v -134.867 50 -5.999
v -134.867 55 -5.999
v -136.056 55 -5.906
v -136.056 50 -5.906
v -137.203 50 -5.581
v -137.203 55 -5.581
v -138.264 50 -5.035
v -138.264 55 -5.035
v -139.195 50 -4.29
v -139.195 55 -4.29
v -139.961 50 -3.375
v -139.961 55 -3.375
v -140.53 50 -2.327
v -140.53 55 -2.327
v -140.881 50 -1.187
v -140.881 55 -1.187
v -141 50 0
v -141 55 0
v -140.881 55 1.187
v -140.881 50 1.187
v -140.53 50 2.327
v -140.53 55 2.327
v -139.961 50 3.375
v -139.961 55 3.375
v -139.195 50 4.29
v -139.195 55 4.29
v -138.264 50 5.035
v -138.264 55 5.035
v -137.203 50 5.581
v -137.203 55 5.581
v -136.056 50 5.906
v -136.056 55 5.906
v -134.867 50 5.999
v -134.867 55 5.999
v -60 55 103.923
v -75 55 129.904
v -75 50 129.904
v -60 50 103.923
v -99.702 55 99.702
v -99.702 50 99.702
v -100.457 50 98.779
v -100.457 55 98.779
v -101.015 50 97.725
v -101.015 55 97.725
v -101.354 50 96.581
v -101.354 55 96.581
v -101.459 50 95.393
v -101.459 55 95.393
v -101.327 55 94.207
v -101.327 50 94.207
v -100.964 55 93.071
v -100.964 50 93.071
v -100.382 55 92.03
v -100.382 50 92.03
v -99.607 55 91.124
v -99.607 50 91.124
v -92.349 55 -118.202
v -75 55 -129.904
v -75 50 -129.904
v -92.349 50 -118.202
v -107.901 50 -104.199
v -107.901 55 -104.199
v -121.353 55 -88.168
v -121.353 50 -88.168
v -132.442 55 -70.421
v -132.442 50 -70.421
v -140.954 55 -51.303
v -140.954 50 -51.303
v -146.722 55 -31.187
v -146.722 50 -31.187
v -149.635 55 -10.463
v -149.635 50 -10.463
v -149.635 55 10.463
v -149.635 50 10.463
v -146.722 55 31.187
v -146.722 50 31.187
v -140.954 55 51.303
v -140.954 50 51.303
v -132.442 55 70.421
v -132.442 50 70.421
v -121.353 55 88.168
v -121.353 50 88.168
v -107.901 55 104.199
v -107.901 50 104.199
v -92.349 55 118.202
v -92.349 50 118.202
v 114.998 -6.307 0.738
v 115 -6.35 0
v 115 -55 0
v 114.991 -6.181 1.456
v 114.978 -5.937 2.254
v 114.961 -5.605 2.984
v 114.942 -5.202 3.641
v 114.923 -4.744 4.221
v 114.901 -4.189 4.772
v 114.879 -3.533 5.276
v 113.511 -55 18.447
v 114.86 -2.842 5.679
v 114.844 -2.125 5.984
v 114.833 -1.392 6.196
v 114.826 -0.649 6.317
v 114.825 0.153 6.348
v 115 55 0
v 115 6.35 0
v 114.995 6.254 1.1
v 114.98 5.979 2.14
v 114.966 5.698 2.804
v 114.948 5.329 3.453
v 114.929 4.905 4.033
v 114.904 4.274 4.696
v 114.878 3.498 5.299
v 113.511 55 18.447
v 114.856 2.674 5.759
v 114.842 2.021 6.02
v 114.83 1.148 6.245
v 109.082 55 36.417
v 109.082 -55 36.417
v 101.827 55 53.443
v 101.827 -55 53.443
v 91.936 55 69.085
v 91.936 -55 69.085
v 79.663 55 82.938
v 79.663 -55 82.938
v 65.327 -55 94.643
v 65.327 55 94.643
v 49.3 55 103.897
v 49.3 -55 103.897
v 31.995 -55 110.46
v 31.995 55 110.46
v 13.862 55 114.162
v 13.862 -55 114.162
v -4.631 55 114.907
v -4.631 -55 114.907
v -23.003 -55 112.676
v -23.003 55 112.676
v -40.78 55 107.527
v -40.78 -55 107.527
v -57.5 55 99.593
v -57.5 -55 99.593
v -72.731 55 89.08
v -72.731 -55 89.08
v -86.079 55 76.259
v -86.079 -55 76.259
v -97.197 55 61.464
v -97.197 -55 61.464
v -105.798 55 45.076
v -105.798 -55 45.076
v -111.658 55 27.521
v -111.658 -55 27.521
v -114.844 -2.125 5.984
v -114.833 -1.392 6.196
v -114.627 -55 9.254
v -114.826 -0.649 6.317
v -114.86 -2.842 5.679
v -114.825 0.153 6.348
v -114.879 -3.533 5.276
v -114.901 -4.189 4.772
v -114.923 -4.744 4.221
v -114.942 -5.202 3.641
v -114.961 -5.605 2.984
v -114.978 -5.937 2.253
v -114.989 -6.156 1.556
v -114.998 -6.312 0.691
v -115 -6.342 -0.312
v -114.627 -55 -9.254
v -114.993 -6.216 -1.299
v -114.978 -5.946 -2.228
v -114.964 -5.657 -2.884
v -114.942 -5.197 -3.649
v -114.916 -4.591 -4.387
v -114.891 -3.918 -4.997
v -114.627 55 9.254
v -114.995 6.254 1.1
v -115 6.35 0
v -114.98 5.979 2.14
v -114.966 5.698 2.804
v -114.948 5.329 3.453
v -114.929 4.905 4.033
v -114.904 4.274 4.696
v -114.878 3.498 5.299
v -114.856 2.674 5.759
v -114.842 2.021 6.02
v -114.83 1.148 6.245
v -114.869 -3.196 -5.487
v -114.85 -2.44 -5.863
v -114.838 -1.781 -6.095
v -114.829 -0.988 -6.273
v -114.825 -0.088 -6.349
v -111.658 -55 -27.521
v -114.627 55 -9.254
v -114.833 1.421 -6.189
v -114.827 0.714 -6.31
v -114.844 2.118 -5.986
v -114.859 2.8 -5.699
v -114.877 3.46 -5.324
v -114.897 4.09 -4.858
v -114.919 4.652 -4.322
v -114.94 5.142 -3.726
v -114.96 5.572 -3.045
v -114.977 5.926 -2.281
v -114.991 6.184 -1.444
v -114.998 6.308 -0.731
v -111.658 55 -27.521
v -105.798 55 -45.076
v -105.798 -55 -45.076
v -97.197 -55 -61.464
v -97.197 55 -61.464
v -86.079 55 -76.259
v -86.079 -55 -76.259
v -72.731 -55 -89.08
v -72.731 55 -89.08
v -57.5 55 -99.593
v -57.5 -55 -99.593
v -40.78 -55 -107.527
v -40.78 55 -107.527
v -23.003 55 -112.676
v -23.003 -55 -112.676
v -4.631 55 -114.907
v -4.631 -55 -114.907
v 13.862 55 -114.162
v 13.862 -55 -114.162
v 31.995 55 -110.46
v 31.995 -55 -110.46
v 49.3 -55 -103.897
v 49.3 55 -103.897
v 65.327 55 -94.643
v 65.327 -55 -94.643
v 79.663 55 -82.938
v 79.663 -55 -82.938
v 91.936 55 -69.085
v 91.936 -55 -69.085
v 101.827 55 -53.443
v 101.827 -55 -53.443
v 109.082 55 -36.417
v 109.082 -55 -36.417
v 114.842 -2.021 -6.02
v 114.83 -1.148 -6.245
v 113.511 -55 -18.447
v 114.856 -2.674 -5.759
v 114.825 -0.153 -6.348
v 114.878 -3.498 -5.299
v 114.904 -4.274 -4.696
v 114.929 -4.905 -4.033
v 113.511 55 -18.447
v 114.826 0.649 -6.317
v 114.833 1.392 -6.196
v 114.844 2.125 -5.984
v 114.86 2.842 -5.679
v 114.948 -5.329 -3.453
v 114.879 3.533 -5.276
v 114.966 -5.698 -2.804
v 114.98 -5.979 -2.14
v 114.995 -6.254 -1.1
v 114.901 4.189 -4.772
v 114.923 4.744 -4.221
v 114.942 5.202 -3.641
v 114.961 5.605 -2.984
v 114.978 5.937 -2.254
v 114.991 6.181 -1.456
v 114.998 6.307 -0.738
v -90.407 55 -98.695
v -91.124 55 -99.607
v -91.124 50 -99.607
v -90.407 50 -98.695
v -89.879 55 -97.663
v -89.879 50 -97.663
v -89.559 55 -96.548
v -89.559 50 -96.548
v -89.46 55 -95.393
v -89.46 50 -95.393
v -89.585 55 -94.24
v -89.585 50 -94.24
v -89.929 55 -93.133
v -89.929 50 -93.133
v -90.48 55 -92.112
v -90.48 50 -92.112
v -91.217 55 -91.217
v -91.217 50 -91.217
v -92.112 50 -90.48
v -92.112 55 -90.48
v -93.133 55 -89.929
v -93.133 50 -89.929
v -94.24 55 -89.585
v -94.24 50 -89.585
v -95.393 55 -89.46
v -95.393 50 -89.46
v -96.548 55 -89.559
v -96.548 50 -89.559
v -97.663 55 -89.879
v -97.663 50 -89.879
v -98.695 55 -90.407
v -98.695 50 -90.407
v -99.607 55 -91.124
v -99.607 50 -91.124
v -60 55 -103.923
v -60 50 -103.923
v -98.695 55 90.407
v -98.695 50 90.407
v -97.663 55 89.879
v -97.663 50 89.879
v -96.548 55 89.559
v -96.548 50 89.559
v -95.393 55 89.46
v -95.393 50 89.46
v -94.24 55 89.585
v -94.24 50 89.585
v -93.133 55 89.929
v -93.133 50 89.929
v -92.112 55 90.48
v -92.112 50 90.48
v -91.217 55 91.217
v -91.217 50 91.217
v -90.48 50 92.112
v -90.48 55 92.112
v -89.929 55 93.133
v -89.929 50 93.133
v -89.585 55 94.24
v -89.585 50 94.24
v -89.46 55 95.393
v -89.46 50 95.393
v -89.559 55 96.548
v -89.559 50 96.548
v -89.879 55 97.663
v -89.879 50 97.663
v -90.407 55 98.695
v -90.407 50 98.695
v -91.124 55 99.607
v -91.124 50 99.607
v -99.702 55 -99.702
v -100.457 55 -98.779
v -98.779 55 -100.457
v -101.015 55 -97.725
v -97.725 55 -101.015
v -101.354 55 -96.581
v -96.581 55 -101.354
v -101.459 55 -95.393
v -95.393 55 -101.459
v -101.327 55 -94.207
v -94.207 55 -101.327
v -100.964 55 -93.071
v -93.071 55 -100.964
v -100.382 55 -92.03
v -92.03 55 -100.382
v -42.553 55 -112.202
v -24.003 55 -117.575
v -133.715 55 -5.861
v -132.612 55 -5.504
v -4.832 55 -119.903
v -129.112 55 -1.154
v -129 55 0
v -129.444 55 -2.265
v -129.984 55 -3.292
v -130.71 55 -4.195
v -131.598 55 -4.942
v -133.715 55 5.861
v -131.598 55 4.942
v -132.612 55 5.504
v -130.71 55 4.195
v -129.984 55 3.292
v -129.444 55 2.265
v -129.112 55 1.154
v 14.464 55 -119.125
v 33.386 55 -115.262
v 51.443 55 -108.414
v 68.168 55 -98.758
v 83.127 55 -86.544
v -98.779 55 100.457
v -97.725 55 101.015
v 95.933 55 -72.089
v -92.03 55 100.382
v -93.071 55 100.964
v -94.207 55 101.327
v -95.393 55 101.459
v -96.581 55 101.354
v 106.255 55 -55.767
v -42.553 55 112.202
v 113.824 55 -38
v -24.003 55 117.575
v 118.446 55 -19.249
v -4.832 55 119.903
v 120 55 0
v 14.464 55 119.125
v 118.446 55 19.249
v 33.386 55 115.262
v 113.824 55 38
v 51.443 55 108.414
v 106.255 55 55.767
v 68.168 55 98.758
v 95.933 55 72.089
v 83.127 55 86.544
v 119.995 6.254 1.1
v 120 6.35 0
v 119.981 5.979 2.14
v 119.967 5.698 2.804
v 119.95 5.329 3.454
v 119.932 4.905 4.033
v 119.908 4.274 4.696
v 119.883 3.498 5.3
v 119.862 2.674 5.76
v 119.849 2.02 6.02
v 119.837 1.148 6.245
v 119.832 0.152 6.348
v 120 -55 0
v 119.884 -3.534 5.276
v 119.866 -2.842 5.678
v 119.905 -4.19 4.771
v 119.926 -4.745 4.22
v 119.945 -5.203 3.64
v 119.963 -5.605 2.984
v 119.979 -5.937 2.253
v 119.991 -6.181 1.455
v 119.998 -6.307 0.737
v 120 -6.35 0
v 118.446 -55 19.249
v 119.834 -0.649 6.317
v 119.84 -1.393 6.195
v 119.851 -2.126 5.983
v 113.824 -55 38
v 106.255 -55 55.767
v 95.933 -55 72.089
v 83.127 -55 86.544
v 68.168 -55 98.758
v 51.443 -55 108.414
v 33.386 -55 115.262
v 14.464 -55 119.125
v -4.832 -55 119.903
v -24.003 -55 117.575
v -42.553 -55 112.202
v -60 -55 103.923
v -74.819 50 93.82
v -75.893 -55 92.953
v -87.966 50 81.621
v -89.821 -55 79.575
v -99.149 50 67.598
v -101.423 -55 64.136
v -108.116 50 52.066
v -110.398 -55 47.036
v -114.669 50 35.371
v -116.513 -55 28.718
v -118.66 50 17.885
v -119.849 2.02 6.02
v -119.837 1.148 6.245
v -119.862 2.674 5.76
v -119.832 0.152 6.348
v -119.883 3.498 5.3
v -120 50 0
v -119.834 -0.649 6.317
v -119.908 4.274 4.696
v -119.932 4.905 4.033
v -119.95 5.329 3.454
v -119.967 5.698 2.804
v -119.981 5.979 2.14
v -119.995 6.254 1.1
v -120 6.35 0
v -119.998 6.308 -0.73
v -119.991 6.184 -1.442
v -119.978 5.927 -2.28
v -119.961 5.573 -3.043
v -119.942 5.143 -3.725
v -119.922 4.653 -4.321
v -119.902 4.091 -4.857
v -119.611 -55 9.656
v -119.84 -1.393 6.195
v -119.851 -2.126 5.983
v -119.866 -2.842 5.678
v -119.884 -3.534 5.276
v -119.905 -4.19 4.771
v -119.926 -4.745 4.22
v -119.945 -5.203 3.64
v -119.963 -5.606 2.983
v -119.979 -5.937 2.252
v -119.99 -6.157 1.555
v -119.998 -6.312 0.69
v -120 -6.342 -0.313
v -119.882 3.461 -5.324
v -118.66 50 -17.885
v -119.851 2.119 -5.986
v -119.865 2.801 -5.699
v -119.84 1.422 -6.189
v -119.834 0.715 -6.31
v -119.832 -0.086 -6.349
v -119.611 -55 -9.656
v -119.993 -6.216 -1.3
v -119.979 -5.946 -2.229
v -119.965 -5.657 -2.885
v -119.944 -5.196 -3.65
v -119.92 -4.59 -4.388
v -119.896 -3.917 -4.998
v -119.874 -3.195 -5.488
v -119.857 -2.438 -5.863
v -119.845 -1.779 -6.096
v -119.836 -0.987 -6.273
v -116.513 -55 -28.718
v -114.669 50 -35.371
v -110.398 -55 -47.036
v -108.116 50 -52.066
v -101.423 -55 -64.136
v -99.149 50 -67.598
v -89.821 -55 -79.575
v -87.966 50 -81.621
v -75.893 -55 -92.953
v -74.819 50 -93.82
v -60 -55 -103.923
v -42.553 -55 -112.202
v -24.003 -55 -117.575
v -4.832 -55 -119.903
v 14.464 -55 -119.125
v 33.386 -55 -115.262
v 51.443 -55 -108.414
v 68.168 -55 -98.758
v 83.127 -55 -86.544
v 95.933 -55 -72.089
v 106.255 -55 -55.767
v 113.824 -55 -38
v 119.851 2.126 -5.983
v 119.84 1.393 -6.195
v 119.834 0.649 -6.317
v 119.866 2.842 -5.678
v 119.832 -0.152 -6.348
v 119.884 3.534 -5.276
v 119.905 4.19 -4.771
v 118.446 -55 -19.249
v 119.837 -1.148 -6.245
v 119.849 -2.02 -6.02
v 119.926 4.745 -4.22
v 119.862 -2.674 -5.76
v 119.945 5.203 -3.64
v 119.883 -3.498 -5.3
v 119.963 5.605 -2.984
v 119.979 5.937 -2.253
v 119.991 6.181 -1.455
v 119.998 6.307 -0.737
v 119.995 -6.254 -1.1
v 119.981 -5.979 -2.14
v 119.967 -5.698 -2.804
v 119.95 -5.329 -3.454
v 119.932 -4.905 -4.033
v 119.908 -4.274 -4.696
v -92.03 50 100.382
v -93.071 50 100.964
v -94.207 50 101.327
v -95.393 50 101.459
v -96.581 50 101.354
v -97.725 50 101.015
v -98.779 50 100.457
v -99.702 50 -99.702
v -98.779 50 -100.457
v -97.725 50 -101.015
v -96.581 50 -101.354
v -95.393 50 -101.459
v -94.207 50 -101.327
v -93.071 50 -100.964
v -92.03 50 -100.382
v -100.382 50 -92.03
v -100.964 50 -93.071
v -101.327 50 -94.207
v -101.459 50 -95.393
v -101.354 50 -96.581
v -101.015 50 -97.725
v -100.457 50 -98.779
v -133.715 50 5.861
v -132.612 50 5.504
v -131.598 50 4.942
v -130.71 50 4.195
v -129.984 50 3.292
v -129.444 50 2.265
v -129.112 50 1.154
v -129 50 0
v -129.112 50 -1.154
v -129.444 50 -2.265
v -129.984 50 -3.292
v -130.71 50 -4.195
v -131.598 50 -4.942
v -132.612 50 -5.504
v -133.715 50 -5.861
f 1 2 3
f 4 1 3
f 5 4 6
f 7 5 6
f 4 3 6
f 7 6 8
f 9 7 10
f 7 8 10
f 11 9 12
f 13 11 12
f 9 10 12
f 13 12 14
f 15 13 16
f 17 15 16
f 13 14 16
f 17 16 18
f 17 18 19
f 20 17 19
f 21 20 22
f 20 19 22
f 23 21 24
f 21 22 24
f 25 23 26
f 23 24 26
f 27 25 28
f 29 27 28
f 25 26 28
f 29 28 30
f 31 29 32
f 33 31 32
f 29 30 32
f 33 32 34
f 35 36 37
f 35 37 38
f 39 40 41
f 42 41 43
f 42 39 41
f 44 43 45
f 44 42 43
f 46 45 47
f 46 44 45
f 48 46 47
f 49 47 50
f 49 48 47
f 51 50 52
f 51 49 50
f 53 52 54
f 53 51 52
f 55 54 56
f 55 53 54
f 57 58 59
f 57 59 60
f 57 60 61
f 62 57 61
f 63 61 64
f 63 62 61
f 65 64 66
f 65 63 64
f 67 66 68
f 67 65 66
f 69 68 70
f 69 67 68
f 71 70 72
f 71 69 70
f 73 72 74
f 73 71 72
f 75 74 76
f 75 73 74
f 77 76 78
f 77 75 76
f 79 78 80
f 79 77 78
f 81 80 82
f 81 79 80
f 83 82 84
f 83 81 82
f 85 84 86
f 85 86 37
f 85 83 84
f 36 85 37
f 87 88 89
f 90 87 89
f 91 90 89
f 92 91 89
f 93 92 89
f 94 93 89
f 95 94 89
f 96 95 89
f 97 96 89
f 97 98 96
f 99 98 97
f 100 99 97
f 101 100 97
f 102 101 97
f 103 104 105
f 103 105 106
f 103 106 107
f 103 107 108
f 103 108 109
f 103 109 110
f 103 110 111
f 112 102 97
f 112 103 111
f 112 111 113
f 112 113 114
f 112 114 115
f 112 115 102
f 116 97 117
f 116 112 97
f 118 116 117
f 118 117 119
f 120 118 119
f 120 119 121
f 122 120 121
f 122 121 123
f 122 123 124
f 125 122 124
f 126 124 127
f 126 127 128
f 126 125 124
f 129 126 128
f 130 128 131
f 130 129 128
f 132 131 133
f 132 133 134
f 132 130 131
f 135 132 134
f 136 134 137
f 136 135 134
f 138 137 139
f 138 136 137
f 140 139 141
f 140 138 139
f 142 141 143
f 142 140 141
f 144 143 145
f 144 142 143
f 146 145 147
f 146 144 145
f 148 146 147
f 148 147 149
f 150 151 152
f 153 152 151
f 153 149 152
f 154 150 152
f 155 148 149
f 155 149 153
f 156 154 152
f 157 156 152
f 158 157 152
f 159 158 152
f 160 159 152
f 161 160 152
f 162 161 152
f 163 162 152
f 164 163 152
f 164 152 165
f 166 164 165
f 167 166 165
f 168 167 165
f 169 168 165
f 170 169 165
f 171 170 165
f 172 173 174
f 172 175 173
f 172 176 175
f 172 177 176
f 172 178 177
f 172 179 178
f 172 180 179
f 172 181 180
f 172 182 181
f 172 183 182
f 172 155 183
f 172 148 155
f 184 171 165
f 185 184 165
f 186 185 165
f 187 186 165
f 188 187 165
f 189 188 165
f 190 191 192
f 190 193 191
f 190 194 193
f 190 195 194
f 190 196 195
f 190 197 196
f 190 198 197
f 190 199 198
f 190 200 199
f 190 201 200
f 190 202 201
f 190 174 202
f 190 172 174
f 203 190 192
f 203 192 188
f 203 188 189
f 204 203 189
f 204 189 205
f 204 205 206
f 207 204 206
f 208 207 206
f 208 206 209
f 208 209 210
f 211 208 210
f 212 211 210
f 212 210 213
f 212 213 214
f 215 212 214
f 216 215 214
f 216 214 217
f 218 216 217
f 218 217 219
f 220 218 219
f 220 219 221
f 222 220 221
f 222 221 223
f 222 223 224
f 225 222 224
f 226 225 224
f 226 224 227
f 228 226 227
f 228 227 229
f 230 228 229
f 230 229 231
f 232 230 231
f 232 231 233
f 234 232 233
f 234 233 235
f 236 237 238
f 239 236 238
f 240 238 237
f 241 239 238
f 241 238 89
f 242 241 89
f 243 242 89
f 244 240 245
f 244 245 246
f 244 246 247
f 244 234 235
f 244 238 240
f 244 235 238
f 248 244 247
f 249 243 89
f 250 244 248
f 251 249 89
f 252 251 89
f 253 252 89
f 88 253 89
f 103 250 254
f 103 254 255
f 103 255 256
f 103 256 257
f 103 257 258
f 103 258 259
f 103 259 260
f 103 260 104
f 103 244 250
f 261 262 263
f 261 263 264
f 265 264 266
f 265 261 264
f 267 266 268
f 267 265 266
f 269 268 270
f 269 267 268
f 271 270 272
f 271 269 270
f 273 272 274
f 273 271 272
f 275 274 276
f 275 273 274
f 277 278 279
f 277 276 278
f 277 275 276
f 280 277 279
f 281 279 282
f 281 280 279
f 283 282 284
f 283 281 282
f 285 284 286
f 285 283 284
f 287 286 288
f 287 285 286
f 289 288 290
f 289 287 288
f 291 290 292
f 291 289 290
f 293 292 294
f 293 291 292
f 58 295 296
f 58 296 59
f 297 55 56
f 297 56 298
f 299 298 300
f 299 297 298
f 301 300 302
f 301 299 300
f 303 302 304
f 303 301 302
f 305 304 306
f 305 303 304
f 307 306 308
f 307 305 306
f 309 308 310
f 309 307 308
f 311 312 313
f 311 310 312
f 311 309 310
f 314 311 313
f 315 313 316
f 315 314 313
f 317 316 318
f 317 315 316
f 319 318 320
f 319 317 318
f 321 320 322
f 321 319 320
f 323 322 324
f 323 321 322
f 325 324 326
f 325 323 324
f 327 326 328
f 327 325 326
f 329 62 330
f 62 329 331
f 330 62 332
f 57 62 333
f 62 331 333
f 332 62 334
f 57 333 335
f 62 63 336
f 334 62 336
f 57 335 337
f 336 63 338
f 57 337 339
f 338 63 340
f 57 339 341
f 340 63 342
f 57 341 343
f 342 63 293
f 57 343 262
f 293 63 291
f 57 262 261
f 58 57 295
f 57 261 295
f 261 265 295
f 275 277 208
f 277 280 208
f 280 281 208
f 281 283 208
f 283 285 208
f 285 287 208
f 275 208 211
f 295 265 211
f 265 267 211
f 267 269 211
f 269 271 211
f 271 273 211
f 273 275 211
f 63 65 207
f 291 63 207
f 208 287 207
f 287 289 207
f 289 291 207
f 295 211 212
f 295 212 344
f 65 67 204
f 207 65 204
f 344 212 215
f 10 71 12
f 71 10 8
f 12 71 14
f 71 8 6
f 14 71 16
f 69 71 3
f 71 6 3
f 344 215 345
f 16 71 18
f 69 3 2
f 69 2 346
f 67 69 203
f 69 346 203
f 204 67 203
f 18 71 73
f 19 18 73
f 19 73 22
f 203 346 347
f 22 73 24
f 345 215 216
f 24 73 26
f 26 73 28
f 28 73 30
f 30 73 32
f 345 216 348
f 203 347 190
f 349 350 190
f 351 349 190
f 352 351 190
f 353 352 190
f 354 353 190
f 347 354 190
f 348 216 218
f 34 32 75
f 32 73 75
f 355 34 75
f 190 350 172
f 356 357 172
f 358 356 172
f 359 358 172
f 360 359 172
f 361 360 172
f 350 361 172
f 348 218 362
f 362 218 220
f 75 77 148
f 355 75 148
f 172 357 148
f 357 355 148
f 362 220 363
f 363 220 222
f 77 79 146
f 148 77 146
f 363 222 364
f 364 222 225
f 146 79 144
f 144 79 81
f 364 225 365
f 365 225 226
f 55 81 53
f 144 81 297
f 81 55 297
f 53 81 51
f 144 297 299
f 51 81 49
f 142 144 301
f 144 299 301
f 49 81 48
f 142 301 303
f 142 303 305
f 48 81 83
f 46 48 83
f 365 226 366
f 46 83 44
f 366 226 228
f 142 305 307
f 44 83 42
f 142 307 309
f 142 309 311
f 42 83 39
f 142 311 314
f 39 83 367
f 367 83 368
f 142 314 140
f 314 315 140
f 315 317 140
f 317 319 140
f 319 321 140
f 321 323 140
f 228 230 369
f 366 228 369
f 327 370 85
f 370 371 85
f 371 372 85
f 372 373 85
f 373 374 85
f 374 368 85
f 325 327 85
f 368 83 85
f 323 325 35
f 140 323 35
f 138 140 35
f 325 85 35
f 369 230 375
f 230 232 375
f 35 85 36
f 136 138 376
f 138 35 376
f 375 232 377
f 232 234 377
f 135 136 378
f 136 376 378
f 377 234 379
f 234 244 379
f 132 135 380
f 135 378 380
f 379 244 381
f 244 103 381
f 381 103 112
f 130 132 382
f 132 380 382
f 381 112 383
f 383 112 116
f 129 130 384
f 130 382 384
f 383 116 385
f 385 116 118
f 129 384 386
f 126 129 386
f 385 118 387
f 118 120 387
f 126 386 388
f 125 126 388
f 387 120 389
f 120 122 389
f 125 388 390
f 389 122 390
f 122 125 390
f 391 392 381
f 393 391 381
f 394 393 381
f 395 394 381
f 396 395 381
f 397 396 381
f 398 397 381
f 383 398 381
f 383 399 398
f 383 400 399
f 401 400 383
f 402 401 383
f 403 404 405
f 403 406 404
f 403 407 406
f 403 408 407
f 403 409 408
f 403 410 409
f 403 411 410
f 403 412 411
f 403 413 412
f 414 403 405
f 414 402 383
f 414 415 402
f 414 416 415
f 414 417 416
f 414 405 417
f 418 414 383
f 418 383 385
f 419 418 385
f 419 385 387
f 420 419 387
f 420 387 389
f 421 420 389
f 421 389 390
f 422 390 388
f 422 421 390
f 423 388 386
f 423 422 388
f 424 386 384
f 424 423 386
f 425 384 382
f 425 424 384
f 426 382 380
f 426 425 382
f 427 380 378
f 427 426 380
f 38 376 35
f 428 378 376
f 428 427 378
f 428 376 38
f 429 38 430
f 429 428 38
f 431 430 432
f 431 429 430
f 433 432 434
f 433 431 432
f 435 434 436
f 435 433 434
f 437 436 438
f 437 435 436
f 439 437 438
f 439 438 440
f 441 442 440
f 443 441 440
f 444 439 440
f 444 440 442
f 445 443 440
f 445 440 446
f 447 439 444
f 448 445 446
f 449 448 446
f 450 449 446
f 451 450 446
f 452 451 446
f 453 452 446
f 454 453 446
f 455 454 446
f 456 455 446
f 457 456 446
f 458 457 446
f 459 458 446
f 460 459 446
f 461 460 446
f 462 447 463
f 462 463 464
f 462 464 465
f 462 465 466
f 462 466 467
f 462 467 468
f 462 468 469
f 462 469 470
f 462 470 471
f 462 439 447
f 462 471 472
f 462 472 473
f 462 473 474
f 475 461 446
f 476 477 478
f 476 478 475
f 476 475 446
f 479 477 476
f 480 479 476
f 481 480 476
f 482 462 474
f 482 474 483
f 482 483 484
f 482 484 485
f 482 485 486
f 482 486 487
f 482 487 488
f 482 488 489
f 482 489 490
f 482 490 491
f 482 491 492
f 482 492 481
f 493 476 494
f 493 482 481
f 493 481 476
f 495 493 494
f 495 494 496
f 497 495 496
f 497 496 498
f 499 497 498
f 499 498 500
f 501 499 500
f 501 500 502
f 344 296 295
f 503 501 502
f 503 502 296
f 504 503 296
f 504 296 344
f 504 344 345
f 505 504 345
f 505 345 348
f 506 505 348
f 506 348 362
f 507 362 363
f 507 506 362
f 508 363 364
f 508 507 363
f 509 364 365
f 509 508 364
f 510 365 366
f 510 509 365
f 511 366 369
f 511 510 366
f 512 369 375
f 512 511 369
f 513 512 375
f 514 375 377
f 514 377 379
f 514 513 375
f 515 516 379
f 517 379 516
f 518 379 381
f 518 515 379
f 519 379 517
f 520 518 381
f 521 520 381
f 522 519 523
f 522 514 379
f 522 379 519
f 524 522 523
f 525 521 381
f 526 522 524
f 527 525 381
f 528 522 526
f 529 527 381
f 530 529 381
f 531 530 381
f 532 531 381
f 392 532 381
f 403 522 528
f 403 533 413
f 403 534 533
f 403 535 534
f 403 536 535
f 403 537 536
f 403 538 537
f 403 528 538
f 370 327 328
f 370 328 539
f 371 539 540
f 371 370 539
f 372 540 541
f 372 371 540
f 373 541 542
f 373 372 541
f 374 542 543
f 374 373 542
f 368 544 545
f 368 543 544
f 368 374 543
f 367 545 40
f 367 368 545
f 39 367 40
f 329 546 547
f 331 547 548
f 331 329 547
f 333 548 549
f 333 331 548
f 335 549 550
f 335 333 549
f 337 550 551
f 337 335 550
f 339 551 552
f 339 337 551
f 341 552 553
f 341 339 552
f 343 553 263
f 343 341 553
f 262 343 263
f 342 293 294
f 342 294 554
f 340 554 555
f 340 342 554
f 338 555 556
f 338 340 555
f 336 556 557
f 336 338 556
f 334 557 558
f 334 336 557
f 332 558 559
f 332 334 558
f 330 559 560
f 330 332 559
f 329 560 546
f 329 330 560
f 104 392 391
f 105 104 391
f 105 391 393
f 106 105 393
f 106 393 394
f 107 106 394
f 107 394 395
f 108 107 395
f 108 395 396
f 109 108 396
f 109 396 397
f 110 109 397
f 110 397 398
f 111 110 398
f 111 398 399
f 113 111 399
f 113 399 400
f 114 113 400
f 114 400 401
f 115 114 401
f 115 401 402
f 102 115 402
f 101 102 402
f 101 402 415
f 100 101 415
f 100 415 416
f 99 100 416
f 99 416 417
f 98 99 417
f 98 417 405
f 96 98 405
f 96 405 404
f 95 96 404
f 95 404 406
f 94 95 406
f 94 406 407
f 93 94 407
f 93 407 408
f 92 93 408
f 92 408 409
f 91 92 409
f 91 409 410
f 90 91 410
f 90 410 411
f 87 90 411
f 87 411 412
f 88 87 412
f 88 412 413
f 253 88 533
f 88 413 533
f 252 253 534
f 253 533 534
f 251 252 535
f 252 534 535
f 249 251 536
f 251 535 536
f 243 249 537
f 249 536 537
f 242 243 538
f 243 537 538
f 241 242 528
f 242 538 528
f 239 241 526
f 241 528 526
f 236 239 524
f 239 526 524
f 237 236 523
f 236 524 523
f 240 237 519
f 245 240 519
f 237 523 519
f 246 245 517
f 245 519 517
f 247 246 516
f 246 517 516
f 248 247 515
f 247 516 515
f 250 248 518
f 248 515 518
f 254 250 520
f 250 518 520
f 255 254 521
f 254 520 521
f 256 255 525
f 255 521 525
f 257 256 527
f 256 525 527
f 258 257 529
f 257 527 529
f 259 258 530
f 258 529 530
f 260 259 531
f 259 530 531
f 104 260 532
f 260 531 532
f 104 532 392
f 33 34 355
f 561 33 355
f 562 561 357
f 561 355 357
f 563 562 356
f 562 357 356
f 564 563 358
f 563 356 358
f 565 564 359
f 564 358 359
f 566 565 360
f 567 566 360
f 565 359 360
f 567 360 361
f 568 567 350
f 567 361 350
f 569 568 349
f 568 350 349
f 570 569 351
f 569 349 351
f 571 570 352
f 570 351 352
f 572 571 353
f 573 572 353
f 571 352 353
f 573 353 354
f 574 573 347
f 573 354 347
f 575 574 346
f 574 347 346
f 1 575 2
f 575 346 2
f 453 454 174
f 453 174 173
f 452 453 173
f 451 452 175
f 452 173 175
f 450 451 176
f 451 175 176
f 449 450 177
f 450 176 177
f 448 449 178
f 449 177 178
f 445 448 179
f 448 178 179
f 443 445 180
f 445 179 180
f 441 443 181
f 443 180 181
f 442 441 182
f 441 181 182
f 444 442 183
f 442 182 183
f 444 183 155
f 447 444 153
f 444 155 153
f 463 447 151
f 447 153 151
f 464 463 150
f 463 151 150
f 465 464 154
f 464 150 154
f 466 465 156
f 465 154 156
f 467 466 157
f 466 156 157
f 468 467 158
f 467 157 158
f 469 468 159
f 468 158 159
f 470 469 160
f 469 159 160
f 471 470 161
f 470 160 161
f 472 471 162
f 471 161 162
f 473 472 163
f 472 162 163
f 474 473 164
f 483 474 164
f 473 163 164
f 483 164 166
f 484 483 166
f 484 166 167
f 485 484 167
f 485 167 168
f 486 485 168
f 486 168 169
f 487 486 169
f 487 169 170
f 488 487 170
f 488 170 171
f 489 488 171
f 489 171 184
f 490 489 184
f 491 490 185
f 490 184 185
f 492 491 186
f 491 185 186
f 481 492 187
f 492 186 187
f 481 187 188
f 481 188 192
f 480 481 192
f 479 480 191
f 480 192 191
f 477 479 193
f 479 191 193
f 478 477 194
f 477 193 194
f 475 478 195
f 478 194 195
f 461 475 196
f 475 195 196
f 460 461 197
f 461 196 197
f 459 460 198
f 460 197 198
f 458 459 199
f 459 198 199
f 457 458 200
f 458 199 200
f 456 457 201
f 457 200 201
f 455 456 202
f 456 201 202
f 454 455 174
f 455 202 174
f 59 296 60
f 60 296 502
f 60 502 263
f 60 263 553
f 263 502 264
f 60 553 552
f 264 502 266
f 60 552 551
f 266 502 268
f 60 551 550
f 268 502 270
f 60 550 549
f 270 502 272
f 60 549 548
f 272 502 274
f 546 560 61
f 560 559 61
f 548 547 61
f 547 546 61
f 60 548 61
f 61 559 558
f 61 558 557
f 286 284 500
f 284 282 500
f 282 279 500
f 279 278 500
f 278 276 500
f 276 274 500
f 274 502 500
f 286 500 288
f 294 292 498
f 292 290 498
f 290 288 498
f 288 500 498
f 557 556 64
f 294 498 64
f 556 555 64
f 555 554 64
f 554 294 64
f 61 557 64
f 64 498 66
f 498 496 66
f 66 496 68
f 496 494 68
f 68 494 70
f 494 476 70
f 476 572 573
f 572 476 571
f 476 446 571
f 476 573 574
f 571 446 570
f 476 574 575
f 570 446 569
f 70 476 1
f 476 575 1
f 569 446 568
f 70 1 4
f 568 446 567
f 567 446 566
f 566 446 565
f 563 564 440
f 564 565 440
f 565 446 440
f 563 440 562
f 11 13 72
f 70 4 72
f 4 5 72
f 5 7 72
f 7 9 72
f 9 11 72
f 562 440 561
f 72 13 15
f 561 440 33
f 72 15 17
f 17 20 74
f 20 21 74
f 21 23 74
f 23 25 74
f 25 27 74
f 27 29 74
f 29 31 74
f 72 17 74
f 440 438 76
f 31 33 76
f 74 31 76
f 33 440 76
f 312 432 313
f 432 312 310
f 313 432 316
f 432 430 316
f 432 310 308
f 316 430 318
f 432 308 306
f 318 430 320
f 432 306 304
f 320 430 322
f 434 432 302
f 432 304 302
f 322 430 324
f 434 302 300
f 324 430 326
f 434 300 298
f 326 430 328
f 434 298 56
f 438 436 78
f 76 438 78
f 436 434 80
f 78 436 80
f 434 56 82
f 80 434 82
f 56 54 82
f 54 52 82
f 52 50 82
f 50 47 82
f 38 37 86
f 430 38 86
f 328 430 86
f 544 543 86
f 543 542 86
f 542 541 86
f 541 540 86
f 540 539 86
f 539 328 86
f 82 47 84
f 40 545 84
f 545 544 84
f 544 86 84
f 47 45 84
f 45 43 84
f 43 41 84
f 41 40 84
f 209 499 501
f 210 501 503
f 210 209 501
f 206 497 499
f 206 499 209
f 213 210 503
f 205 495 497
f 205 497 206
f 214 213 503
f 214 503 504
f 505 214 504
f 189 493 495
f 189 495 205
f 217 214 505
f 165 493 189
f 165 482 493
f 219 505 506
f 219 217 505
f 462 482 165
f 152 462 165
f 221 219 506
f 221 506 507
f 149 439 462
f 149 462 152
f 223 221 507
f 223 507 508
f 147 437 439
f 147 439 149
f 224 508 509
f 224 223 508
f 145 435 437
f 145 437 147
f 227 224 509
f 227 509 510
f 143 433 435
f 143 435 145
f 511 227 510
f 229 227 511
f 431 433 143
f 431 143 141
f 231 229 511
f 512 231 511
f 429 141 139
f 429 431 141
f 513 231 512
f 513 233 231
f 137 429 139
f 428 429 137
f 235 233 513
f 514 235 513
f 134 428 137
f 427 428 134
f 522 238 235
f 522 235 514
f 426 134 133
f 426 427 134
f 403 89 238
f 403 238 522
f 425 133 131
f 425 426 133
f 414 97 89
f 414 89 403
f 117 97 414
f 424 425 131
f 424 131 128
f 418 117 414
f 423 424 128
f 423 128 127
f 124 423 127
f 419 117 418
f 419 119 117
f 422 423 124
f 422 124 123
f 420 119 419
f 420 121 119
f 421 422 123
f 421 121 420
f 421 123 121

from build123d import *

# Parameters (mm, degrees)
F0_R     = 120
F0_R_2   = 115
F1_DEPTH = 55
F3_DEPTH = 5
F5_DEPTH = 110.001
F6_R     = 6.35
F7_DEPTH = 254


# Not quite as in the source:
# - a pattern or mirror of a feature is missing from the dataset's text; its kind, count and spacing are read off the source's solid


with BuildPart() as f1:
    # F0 (on Front) → F1 (new body, symmetric)
    with BuildSketch(Plane.XZ):
        Circle(F0_R)
        Circle(F0_R_2, mode=Mode.SUBTRACT)
    extrude(amount=F1_DEPTH, both=True)

    # F2 (on face) → F3 (join)
    with BuildSketch(Plane(origin=(0, 55, 0), x_dir=(-1, 0, 0), z_dir=(0, 1, 0))):
        with BuildLine():
            Line((60, -103.9230484541), (75, -129.9038105677))
            ThreePointArc((75, -129.9038105677), (150, 0), (75, 129.9038105677))
            Line((75, 129.9038105677), (60, 103.9230484541))
            ThreePointArc((60, 103.9230484541), (103.9230484541, 60), (120, 0))
            ThreePointArc((120, 0), (103.9230484541, -60), (60, -103.9230484541))
        make_face()
    extrude(amount=-F3_DEPTH)

    # F4 (on face) → F5 (cut, through all)
    with BuildSketch(Plane(origin=(0, 55, 0), x_dir=(-1, 0, 0), z_dir=(0, 1, 0))):
        with BuildLine():
            ThreePointArc((134.8666666667, 5.9985183356), (134.9666625504, 3), (135, 0))
            ThreePointArc((135, 0), (134.9666625504, -3), (134.8666666667, -5.9985183356))
            ThreePointArc((134.8666666667, -5.9985183356), (139.1952353927, -4.2895221179), (141, 0))
            ThreePointArc((141, 0), (139.1952353927, 4.2895221179), (134.8666666667, 5.9985183356))
        make_face()
        with BuildLine():
            ThreePointArc((134.8666666667, -5.9985183356), (134.9666625504, -3), (135, 0))
            ThreePointArc((135, 0), (134.9666625504, 3), (134.8666666667, 5.9985183356))
            ThreePointArc((134.8666666667, 5.9985183356), (129, 0), (134.8666666667, -5.9985183356))
        make_face()
    f5 = extrude(amount=-F5_DEPTH, mode=Mode.SUBTRACT)

    # F5_copies: F5 across plane
    add(f5.mirror(Plane(origin=(0, 0, 0), x_dir=(-0.9238795325, 0, -0.3826834324), z_dir=(0.3826834324, 0, -0.9238795325))), mode=Mode.SUBTRACT)

    # F5_copies1: F5 across plane
    add(f5.mirror(Plane(origin=(0, 0, 0), x_dir=(0.9238795325, 0, -0.3826834324), z_dir=(0.3826834324, 0, 0.9238795325))), mode=Mode.SUBTRACT)

    # F6 (on Right) → F7 (cut, symmetric)
    with BuildSketch(Plane.YZ):
        Circle(F6_R)
    extrude(amount=F7_DEPTH, both=True, mode=Mode.SUBTRACT)


solid = f1.part
